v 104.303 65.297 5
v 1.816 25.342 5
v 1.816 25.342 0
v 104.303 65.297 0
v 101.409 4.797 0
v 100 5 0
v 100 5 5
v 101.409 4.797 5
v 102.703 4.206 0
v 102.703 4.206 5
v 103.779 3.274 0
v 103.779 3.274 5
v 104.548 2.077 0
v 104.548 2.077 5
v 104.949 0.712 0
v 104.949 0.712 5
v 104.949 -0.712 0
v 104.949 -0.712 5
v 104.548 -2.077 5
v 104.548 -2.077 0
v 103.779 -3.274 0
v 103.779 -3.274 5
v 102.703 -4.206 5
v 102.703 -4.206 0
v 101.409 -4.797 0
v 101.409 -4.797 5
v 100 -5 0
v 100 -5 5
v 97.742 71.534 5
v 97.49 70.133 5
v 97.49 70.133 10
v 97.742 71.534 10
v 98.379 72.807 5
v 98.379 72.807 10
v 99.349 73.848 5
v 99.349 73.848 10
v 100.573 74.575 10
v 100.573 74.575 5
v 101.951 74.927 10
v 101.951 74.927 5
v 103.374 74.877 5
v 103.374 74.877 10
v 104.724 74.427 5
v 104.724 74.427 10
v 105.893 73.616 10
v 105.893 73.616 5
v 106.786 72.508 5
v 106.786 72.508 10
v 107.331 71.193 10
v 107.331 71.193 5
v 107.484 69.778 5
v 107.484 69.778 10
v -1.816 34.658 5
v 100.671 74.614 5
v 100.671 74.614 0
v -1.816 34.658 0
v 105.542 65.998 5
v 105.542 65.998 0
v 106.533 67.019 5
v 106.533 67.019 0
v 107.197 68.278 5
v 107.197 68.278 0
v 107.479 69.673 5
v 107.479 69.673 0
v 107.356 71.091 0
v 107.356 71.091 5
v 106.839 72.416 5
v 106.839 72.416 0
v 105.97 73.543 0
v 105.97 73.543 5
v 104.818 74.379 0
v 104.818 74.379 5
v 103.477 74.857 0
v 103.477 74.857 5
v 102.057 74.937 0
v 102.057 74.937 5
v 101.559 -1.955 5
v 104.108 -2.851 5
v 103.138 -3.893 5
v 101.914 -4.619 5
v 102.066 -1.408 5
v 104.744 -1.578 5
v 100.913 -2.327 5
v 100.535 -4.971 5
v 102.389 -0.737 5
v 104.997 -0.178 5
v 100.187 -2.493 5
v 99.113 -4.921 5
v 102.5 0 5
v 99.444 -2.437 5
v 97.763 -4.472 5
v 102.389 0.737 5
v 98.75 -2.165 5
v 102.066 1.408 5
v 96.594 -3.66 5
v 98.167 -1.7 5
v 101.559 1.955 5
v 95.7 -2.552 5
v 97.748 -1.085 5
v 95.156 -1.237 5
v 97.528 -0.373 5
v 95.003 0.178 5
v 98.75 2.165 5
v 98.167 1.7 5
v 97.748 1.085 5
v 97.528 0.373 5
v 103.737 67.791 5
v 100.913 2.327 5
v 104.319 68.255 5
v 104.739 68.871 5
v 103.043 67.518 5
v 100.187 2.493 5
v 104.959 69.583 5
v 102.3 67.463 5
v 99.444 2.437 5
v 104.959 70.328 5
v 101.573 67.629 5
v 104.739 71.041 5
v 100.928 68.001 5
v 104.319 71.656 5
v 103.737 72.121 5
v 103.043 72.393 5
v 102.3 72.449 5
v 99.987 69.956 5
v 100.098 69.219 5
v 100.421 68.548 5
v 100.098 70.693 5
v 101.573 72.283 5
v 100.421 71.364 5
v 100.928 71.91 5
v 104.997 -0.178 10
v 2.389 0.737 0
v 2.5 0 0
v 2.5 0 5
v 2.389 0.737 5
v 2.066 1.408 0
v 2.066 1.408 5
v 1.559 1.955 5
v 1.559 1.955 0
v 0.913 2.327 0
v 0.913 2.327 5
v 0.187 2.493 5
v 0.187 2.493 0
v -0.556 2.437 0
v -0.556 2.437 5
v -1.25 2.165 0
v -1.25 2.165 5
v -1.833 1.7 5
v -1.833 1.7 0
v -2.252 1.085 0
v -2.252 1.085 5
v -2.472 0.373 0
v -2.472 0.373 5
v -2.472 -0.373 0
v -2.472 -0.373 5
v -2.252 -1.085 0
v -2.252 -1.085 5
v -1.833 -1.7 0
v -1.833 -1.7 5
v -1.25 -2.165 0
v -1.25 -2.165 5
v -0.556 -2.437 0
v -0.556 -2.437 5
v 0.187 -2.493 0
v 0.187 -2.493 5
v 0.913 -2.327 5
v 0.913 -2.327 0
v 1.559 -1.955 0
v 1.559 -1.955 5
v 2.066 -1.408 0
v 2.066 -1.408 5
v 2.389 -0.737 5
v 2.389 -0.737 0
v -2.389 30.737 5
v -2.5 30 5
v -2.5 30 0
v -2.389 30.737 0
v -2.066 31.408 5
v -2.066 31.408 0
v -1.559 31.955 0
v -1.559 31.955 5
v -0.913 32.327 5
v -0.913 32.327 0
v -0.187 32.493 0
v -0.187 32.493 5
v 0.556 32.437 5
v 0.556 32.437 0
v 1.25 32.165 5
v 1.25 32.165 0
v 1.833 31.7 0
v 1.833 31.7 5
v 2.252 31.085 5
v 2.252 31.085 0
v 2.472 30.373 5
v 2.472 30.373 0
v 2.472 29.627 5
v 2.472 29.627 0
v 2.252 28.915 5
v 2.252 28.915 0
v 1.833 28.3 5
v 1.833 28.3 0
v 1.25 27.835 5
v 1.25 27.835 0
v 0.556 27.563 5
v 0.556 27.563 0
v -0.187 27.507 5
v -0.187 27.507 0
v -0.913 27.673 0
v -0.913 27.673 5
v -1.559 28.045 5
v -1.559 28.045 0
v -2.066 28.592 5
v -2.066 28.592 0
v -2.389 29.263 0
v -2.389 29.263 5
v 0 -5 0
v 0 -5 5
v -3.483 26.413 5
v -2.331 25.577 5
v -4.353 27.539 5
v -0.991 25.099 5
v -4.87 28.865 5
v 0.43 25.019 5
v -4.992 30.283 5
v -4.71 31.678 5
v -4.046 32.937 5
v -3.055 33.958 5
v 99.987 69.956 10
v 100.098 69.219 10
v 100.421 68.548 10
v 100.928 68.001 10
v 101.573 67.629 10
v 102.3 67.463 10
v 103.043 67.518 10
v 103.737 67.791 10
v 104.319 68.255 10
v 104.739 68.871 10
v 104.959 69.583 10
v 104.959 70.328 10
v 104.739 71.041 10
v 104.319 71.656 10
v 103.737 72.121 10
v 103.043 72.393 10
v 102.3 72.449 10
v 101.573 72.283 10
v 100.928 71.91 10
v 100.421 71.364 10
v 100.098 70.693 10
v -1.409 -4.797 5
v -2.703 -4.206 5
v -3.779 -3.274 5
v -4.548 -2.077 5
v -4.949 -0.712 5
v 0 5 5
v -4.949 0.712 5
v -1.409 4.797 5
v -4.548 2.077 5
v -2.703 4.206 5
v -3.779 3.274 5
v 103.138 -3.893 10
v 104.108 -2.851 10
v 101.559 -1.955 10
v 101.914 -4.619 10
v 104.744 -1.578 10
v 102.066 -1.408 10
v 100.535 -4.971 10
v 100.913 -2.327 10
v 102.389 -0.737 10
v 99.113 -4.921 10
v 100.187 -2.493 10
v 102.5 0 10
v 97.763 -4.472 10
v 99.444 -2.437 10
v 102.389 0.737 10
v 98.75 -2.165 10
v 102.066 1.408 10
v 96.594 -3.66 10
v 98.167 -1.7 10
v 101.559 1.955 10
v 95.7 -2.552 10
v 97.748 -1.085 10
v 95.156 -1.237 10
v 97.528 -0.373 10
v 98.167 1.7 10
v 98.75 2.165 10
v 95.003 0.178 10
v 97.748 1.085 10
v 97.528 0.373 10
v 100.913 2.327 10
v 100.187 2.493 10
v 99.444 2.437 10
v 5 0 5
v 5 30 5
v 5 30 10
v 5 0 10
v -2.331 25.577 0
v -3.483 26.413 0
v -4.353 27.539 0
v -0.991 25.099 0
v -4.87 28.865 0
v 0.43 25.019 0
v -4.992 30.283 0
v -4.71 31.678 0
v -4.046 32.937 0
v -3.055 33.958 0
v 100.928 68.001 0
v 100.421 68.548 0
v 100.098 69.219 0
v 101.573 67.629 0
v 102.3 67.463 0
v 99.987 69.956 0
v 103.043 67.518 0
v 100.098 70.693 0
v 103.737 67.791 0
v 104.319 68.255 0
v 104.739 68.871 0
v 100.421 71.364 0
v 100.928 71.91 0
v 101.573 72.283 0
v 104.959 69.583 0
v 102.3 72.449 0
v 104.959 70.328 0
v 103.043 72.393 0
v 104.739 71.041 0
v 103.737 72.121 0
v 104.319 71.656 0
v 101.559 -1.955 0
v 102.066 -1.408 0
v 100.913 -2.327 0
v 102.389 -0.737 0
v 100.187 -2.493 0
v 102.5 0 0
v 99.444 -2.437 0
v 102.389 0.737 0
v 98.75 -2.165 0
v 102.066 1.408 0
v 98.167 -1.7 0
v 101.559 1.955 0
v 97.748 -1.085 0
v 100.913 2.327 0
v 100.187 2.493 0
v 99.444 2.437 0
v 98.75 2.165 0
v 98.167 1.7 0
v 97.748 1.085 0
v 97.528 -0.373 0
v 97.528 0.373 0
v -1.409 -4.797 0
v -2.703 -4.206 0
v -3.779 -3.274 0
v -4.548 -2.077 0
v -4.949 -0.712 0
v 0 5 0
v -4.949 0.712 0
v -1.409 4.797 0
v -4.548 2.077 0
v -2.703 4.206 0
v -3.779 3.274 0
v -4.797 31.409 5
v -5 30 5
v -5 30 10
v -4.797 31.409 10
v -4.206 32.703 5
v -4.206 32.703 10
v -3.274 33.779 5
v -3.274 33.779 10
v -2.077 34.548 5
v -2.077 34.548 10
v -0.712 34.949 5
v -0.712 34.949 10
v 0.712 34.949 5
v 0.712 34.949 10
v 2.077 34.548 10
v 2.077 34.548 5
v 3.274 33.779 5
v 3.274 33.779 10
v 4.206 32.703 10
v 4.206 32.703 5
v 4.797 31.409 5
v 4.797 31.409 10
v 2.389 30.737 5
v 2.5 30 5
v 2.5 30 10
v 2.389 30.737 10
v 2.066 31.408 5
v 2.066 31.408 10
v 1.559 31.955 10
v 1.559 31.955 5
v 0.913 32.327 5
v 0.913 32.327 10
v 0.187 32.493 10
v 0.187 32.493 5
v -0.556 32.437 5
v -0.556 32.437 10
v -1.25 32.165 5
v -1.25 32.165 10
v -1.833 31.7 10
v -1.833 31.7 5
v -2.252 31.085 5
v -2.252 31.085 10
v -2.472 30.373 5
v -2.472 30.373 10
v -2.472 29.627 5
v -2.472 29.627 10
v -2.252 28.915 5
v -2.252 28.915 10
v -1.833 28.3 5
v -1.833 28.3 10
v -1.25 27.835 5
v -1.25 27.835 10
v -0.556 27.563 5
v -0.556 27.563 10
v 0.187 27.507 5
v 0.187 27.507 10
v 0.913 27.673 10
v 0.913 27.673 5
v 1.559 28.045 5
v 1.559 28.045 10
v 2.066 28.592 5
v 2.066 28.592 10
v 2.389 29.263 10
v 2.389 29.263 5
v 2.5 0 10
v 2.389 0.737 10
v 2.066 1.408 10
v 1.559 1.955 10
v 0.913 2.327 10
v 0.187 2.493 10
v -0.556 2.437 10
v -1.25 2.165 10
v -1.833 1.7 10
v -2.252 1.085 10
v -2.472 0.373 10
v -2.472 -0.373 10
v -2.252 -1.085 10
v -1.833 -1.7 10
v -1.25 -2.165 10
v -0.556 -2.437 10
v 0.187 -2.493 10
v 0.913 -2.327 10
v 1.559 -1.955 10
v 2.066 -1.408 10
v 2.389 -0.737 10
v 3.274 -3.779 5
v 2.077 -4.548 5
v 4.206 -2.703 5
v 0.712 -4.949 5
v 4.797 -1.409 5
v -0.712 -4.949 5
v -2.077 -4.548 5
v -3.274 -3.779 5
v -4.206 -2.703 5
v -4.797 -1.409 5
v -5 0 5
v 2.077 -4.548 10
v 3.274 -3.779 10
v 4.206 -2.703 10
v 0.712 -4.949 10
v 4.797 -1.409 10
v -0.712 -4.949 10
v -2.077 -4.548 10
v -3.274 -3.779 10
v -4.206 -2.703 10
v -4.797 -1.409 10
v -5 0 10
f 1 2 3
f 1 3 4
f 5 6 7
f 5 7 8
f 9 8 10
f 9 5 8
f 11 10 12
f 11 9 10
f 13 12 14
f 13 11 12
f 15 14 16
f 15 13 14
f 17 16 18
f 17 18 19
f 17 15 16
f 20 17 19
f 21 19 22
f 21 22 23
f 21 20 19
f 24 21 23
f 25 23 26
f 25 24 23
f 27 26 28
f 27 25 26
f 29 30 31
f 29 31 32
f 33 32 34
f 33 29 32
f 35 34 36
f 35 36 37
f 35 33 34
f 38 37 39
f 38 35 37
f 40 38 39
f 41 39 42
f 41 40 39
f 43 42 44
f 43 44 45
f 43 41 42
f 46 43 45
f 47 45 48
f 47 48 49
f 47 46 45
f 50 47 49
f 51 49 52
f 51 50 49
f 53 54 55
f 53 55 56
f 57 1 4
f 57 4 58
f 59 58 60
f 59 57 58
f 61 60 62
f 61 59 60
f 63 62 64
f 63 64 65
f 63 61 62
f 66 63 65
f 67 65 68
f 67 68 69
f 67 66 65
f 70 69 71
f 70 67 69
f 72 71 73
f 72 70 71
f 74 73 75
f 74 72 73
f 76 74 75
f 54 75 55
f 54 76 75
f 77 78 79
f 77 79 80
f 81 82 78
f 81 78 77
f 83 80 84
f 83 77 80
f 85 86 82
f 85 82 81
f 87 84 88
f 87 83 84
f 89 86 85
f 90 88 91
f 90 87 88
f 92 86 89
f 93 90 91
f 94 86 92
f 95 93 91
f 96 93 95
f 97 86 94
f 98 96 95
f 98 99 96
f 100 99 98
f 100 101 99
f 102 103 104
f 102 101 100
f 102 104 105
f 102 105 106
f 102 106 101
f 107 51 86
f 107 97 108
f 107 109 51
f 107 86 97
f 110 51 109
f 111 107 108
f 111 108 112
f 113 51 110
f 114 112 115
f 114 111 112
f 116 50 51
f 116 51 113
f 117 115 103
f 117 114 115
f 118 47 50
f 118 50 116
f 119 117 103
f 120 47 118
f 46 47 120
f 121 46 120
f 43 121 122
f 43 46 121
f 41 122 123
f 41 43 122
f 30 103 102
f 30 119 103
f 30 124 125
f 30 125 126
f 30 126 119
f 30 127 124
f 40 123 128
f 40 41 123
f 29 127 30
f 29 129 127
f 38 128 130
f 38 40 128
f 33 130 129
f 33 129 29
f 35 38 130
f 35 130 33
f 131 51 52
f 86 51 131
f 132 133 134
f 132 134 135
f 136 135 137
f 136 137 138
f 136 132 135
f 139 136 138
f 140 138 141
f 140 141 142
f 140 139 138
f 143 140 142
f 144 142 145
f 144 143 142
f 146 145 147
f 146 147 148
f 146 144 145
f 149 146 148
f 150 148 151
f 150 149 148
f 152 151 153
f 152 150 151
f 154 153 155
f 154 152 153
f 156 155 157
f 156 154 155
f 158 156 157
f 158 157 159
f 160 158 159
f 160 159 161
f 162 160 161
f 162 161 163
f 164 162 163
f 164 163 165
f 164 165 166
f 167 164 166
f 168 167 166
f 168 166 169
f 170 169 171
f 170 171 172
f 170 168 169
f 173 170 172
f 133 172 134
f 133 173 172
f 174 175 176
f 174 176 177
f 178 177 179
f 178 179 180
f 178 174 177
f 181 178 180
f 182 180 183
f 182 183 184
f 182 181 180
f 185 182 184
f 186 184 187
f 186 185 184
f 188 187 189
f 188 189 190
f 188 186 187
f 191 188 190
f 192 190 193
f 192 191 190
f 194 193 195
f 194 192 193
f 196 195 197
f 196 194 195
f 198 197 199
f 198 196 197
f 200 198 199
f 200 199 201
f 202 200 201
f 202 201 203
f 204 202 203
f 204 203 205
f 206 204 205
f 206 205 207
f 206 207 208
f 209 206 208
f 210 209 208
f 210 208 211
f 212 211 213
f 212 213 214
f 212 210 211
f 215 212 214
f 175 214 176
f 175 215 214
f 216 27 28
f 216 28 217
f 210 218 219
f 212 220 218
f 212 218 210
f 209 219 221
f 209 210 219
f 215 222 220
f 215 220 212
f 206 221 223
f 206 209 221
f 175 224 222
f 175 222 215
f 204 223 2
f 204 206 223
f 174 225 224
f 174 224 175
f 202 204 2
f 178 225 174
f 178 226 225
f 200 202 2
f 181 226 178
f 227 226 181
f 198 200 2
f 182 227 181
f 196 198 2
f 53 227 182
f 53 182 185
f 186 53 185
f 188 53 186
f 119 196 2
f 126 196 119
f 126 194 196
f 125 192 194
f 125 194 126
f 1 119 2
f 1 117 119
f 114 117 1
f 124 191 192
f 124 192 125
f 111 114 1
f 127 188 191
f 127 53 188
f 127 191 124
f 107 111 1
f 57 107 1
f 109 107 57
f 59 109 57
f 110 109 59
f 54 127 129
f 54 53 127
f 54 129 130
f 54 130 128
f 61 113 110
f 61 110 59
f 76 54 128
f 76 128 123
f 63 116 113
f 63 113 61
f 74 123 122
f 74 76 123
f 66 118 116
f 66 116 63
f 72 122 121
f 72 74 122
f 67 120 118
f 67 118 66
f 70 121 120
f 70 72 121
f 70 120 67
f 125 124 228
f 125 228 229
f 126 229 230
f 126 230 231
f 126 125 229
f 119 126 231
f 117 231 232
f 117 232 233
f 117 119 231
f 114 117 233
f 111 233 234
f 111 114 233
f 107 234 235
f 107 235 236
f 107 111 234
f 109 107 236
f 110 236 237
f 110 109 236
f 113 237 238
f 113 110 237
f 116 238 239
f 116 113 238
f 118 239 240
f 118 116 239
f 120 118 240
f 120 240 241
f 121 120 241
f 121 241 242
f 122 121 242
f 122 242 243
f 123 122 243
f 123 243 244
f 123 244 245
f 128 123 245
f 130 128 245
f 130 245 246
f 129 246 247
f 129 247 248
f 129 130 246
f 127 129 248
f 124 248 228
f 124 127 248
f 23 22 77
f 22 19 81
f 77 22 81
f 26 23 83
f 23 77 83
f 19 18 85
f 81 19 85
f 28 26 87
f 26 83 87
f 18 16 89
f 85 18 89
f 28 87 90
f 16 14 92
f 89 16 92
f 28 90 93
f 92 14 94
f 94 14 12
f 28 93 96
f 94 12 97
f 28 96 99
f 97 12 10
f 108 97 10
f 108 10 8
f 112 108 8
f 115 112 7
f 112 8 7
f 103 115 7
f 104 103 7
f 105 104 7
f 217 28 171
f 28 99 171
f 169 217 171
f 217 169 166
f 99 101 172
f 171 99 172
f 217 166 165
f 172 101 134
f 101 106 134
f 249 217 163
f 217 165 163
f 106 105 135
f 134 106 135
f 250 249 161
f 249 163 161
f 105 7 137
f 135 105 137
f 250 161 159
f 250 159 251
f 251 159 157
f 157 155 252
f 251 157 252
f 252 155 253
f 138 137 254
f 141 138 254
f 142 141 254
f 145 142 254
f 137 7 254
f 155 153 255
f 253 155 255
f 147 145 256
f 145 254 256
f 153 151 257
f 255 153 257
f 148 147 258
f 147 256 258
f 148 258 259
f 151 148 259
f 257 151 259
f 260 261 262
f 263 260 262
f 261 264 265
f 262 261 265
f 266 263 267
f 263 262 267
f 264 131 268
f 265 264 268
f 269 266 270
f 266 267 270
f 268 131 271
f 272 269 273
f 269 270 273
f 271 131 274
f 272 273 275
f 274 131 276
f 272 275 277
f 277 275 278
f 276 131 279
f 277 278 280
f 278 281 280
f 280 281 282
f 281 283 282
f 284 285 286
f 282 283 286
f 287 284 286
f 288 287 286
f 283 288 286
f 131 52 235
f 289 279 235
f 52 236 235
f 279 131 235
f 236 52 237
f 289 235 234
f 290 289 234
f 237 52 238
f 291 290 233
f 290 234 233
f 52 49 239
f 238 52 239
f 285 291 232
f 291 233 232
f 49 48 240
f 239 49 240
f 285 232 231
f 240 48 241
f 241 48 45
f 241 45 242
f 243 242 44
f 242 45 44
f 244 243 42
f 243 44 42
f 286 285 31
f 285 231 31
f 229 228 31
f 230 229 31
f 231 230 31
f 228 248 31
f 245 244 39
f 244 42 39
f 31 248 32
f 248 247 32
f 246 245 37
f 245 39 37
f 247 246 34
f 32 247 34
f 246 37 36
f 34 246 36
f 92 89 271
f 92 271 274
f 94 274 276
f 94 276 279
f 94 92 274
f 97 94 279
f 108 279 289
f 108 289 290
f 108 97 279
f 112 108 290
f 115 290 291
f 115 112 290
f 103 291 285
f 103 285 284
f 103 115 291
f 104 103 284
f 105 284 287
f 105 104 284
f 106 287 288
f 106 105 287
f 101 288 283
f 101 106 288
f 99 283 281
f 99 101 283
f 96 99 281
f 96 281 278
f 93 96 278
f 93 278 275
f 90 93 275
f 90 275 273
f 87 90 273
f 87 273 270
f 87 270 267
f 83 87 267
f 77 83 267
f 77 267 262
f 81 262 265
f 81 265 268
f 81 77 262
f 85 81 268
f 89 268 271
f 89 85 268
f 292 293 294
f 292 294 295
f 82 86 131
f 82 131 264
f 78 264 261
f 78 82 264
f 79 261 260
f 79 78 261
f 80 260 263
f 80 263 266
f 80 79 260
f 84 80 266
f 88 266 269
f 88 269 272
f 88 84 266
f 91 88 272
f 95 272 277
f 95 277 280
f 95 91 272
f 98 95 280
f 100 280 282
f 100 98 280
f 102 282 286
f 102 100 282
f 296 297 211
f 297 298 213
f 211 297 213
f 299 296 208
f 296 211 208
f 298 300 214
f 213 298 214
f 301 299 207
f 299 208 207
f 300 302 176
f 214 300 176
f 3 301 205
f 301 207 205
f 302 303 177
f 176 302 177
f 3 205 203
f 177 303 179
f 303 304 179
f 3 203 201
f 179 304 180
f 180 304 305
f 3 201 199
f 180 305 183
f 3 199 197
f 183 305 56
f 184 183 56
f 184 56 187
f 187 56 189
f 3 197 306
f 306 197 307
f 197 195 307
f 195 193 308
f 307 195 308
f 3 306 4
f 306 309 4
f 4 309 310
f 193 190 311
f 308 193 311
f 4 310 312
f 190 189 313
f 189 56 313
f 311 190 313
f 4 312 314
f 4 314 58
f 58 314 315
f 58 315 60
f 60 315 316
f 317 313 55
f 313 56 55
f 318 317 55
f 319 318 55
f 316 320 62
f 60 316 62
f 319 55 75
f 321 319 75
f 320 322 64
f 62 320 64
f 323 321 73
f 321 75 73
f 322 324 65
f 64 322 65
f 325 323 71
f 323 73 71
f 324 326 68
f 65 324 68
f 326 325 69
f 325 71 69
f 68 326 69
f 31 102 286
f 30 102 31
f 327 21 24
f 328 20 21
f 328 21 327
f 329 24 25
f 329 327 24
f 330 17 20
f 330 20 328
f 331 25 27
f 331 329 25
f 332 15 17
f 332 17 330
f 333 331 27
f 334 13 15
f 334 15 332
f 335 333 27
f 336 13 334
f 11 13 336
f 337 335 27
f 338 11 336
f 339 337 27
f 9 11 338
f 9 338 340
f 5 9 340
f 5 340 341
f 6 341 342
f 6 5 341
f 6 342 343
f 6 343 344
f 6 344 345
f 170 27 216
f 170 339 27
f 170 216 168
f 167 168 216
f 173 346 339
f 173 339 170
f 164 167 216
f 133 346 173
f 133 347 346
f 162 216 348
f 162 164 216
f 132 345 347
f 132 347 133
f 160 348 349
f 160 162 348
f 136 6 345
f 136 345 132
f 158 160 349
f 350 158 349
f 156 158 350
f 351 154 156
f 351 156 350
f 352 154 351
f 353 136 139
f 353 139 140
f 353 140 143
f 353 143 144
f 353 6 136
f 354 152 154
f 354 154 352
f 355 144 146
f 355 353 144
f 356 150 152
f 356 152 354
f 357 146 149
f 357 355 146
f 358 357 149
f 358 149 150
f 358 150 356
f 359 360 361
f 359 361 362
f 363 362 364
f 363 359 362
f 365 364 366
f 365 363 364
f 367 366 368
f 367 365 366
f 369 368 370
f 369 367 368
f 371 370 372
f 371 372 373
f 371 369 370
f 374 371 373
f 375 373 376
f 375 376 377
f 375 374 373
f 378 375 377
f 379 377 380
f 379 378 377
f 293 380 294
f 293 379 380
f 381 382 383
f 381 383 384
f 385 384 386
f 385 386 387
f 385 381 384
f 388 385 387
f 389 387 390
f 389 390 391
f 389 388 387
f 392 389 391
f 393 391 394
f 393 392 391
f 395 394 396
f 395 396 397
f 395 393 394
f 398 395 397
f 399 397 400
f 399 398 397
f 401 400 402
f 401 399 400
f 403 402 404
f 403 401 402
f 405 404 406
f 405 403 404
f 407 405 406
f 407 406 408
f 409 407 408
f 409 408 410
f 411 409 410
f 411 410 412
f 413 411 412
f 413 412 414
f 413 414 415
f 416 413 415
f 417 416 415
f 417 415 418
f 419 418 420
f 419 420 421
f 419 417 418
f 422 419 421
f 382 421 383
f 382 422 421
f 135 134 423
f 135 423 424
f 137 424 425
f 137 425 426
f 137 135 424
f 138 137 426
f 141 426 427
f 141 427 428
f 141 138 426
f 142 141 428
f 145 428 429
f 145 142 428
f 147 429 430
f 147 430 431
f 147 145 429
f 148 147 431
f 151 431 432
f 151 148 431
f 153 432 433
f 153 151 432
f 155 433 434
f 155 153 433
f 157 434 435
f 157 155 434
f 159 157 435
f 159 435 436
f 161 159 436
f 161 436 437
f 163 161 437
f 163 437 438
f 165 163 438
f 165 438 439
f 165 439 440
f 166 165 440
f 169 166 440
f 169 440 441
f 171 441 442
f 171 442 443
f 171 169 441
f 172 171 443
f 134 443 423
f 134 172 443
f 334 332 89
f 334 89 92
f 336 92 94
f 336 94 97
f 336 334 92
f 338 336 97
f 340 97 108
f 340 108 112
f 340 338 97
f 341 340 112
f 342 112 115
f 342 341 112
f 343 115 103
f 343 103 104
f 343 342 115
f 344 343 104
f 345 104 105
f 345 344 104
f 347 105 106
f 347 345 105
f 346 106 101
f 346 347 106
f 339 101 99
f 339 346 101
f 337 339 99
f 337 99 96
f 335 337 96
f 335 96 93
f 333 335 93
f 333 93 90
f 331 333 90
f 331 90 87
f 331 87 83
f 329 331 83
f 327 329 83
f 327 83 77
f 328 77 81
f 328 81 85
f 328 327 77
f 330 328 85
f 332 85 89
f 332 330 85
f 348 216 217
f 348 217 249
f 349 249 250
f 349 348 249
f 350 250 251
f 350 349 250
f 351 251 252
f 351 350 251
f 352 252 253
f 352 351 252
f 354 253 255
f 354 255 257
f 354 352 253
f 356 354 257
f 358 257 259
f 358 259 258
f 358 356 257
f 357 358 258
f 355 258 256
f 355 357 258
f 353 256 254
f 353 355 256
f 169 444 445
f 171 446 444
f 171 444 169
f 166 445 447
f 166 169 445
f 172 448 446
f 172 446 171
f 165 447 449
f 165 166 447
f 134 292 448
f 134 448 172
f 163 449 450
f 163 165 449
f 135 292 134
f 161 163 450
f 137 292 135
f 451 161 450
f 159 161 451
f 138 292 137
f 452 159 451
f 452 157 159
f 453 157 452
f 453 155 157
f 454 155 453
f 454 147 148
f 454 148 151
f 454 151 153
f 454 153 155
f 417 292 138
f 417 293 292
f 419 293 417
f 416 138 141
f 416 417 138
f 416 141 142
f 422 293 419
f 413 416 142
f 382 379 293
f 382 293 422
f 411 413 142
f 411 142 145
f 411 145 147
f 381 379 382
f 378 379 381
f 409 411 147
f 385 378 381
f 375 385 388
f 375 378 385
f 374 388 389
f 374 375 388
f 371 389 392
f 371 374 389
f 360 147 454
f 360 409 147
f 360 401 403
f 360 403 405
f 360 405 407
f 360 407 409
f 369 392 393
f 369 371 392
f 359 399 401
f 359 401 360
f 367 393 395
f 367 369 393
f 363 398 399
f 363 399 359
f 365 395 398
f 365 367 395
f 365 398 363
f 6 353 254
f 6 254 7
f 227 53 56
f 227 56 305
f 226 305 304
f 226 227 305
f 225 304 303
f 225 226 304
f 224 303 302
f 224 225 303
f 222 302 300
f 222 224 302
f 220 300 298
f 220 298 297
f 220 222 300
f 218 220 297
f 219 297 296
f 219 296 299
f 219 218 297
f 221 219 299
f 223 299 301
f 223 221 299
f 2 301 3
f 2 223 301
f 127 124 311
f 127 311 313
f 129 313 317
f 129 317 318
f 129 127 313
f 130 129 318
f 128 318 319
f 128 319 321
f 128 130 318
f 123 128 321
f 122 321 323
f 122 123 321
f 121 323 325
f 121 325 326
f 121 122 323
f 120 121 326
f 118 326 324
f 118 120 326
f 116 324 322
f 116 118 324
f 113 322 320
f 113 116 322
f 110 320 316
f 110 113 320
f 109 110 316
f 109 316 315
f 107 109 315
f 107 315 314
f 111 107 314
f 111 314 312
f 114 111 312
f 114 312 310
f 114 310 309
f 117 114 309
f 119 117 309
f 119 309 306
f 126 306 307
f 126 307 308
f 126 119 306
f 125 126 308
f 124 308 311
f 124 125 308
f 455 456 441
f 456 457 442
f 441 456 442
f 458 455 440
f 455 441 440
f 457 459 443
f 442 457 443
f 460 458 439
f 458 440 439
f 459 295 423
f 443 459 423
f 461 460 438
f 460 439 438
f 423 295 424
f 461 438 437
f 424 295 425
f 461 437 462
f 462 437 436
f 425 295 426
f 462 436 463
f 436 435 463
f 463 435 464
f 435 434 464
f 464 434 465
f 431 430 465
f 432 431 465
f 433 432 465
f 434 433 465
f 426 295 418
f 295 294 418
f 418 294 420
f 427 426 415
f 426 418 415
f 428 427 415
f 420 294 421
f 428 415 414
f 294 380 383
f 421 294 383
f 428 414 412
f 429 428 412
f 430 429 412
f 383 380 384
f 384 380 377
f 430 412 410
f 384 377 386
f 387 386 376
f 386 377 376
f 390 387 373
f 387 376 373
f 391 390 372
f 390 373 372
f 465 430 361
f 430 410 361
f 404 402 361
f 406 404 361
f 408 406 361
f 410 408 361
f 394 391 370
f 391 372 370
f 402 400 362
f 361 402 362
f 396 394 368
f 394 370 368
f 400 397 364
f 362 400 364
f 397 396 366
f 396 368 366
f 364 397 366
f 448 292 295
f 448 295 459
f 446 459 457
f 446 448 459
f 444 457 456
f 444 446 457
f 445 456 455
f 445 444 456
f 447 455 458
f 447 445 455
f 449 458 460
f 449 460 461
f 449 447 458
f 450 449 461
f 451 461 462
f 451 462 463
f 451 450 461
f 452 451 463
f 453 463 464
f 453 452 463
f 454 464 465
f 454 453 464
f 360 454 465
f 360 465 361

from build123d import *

# Parameters (mm, degrees)
SKETCH_2_R      = 2.5
EXTRUDE_1_DEPTH = 5
SKETCH_3_R      = 2.5
EXTRUDE_2_DEPTH = 5
SKETCH_4_R      = 2.5
EXTRUDE_3_DEPTH = 5
SKETCH_5_R      = 2.5
EXTRUDE_4_DEPTH = 5


with BuildPart() as part:
    # 草图2 → 凸台-拉伸1 (new body)
    with BuildSketch(Plane.XY):
        with BuildLine():
            Line((0, 5), (100, 5))
            ThreePointArc((100, 5), (105, 0), (100, -5))
            Line((100, -5), (0, -5))
            ThreePointArc((0, -5), (-5, 0), (0, 5))
        make_face()
        Circle(SKETCH_2_R, mode=Mode.SUBTRACT)
        with Locations((100, 0)):
            Circle(SKETCH_2_R, mode=Mode.SUBTRACT)
    extrude(amount=EXTRUDE_1_DEPTH)


with BuildPart() as body_2:
    # 草图3 → 凸台-拉伸2 (new body)
    with BuildSketch(Plane.XY.offset(5)):
        with BuildLine():
            Line((-5, 0), (-5, 30))
            ThreePointArc((-5, 30), (0, 35), (5, 30))
            Line((5, 30), (5, 0))
            ThreePointArc((5, 0), (0, -5), (-5, 0))
        make_face()
        Circle(SKETCH_3_R, mode=Mode.SUBTRACT)
        with Locations((0, 30)):
            Circle(SKETCH_3_R, mode=Mode.SUBTRACT)
    extrude(amount=EXTRUDE_2_DEPTH)


with BuildPart() as body_3:
    # 草图4 → 凸台-拉伸3 (new body)
    with BuildSketch(Plane(origin=(0, 0, 5), x_dir=(-1, 0, 0), z_dir=(0, 0, -1))):
        with BuildLine():
            Line((-1.816173425, 25.341511609), (-104.30291803, 65.297326959))
            ThreePointArc((-104.30291803, 65.297326959), (-107.145232996, 71.771988775), (-100.67057118, 74.614303741))
            Line((-100.67057118, 74.614303741), (1.816173425, 34.658488391))
            ThreePointArc((1.816173425, 34.658488391), (4.658488391, 28.183826575), (-1.816173425, 25.341511609))
        make_face()
        with Locations((0, 30)):
            Circle(SKETCH_4_R, mode=Mode.SUBTRACT)
        with Locations((-102.486744605, 69.95581535)):
            Circle(SKETCH_4_R, mode=Mode.SUBTRACT)
    extrude(amount=EXTRUDE_3_DEPTH)


with BuildPart() as body_4:
    # 草图5 → 凸台-拉伸4 (new body)
    with BuildSketch(Plane.XY.offset(5)):
        with BuildLine():
            Line((107.483588559, 69.778190735), (104.996843954, -0.177624615))
            ThreePointArc((104.996843954, -0.177624615), (99.822375385, -4.996843954), (95.003156046, 0.177624615))
            Line((95.003156046, 0.177624615), (97.489900651, 70.133439965))
            ThreePointArc((97.489900651, 70.133439965), (102.66436922, 74.952659303), (107.483588559, 69.778190735))
        make_face()
        with Locations((100, 0)):
            Circle(SKETCH_5_R, mode=Mode.SUBTRACT)
        with Locations(Location((102.486744605, 69.95581535, 0), (0, 0, 180))):
            Circle(SKETCH_5_R, mode=Mode.SUBTRACT)
    extrude(amount=EXTRUDE_4_DEPTH)


solid = Compound([part.part, body_2.part, body_3.part, body_4.part])
